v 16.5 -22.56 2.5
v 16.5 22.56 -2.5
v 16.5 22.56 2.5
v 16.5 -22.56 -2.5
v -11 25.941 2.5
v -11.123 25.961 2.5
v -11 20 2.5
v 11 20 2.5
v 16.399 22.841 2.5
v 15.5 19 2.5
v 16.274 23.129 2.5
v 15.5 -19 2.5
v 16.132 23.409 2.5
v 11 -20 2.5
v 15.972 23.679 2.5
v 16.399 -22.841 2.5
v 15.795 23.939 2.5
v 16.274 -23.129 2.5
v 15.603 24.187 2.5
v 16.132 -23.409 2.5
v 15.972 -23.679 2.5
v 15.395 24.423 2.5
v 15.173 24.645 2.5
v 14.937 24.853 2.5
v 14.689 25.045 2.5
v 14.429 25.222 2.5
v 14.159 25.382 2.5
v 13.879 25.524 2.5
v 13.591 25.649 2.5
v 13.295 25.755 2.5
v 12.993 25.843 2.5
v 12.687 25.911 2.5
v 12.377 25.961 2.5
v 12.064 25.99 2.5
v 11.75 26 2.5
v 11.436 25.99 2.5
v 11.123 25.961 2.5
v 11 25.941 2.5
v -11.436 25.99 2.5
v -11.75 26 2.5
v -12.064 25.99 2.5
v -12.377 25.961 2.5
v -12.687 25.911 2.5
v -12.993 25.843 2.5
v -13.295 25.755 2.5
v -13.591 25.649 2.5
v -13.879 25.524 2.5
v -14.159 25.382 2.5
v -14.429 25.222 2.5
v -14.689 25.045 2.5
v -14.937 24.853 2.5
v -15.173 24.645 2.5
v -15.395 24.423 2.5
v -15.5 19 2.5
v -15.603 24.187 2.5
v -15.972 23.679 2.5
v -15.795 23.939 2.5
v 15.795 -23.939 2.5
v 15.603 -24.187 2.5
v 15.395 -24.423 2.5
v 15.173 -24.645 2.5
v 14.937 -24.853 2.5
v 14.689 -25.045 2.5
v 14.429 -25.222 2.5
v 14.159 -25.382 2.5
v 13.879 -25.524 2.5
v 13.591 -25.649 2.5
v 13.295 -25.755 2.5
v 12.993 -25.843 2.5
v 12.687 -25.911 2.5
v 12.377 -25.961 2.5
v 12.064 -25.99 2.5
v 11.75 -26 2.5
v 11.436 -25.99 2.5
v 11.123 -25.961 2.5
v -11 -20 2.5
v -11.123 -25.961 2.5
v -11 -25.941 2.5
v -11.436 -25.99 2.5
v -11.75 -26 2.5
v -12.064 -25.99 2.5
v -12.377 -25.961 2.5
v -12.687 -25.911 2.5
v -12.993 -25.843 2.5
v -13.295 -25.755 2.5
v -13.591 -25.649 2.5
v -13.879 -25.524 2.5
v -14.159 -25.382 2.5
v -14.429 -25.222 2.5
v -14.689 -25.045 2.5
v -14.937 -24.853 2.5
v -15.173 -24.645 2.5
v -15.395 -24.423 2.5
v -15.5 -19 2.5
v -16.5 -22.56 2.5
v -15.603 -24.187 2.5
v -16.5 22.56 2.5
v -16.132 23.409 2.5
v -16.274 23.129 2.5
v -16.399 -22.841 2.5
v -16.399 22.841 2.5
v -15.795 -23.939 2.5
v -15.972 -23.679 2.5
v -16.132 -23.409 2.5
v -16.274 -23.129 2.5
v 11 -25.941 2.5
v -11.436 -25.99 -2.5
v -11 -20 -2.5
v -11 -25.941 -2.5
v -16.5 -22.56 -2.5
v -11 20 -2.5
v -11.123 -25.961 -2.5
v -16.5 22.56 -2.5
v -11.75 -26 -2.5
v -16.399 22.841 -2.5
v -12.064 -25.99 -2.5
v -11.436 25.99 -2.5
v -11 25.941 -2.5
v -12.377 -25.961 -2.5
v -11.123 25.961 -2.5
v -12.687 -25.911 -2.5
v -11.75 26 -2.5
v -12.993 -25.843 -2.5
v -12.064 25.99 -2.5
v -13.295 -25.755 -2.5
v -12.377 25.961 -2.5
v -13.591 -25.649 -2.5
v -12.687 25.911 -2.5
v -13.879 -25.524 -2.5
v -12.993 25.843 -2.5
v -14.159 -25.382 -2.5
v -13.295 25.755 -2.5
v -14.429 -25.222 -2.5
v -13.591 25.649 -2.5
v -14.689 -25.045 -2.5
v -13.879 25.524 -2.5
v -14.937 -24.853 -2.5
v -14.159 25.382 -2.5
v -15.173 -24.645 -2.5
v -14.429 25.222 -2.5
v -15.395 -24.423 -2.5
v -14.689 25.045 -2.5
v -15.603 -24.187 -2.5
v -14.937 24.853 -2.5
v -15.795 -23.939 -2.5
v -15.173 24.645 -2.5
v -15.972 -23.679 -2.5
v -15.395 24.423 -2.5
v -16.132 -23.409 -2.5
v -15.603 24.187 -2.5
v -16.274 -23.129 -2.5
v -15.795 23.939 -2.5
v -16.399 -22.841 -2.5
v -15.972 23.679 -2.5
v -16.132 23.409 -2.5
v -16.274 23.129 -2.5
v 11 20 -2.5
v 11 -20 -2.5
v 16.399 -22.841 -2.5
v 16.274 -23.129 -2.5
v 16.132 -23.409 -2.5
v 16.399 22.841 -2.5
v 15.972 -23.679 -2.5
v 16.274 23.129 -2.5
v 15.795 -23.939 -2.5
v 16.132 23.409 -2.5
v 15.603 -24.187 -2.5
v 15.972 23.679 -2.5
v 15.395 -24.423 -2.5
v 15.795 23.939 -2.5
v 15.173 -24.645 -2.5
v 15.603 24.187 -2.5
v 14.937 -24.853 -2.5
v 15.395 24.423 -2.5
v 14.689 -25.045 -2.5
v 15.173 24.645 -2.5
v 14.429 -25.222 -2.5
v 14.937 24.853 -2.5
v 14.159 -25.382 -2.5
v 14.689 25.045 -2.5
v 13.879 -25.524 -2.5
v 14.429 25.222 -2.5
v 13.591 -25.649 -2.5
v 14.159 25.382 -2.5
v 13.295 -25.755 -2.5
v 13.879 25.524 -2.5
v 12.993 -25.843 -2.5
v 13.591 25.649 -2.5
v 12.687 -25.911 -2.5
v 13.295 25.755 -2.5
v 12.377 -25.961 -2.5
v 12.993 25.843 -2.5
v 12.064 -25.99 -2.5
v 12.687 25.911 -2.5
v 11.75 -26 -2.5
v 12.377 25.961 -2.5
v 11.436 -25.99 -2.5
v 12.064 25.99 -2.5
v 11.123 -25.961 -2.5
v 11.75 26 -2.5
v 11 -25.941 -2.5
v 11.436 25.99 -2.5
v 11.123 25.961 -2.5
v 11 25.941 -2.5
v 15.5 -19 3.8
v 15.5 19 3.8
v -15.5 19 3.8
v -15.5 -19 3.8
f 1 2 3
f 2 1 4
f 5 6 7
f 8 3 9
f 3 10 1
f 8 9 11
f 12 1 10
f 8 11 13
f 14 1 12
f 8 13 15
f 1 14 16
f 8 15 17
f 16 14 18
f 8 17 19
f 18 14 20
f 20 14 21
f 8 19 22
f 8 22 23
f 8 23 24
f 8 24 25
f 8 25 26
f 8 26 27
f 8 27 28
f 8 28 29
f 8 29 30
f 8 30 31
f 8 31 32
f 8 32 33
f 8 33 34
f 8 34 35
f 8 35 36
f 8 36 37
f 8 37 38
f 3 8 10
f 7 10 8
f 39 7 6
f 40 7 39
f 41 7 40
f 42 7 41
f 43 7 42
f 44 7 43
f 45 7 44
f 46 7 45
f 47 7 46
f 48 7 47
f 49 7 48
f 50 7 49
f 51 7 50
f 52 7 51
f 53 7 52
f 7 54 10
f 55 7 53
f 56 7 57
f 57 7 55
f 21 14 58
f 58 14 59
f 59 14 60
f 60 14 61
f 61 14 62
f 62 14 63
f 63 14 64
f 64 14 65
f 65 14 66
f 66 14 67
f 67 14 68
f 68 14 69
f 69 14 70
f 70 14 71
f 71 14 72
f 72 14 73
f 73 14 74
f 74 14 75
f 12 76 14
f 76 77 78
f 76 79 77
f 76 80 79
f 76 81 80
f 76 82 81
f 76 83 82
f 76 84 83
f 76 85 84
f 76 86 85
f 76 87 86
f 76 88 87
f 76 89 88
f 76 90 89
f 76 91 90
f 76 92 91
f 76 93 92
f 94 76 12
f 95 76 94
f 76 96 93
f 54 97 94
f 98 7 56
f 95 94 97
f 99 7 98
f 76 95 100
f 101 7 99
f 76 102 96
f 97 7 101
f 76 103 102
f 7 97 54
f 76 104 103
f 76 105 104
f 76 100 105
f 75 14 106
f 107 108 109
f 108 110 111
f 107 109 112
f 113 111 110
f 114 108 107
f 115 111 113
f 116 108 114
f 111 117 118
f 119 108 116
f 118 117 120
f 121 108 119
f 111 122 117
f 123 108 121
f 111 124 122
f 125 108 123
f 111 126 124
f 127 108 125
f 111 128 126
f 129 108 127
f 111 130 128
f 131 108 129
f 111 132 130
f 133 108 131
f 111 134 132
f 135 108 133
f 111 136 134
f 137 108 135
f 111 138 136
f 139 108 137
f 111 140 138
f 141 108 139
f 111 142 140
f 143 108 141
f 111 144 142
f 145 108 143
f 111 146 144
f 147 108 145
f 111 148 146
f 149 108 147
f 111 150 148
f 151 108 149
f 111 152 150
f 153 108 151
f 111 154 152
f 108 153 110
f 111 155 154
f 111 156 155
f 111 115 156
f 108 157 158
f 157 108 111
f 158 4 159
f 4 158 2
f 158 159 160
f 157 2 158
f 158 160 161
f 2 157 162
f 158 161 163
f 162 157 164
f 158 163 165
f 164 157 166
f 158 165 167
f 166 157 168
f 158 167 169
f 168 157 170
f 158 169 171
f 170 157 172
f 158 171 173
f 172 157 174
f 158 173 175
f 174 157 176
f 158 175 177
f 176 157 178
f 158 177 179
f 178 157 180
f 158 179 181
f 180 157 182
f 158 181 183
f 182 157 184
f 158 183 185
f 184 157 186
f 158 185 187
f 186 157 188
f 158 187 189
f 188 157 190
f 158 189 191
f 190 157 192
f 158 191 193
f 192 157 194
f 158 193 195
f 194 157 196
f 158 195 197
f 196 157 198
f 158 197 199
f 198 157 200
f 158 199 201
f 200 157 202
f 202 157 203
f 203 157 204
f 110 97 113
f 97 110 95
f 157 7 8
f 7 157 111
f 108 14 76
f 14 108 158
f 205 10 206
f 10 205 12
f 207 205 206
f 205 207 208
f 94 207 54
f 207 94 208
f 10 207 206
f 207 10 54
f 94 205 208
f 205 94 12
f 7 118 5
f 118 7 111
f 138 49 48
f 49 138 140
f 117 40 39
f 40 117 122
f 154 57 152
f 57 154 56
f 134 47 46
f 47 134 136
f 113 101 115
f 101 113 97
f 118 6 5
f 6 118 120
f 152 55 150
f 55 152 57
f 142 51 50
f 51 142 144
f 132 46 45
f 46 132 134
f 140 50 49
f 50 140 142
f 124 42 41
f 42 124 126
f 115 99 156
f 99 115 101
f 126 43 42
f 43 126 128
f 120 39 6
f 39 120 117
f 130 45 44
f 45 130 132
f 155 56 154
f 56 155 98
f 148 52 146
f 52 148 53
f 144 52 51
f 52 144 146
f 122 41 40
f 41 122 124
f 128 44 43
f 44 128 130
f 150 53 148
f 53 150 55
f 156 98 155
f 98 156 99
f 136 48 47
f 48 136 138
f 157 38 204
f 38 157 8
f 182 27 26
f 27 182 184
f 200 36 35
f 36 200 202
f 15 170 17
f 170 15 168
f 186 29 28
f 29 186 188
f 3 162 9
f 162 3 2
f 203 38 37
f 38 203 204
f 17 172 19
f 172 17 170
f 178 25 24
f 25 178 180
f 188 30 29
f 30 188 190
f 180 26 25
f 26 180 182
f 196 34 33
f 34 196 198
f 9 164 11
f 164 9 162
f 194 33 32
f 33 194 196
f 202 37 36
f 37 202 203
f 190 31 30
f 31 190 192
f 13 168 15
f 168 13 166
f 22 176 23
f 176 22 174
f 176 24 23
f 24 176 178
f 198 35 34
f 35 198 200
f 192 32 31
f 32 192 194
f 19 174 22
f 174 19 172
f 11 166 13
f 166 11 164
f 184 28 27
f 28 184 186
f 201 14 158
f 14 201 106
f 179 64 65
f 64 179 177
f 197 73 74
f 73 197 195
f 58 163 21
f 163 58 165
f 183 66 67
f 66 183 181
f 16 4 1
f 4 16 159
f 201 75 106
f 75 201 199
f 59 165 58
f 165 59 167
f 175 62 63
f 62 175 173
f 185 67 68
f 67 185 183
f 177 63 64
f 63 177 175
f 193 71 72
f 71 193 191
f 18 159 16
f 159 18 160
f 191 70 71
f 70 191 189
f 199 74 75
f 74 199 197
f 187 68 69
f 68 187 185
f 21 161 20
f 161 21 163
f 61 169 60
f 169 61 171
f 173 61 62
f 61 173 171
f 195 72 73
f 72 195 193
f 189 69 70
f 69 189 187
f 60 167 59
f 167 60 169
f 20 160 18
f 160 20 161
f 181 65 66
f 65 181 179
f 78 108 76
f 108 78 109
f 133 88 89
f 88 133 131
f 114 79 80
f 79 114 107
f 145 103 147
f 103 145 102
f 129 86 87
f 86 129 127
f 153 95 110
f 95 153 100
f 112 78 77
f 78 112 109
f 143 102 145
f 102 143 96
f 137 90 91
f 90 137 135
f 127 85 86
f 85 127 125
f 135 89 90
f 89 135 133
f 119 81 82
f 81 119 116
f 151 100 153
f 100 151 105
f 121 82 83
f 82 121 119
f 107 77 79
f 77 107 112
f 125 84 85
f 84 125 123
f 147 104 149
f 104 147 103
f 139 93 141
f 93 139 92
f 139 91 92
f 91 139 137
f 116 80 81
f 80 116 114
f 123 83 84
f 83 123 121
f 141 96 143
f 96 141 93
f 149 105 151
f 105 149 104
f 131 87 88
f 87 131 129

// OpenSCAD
$fn = 100;

strap_width = 22;
strap_length = 40;
ws2812_length = 5;
ws2812_width = 5;

light_rows = 4;
light_columns = 3;

face_width = strap_width * 1.5;
face_length = 40;
face_height = 5;

pcb_width = face_width - 2;
pcb_length = face_length - 2;
pcb_height = 1.6;

lug_width = (face_width - strap_width) / 2;
lug_length = 7;
lug_height = face_height;

union() {
    %straps();
    face();
    lugs();
}

module face() {
    cube([face_width, face_length, face_height], center=true);
    translate([0, 0, 3])
        color("blue")
        cube([pcb_width, pcb_length, pcb_height], center=true);
    %lights();
}

module lug() {
    intersection() {
        cube([lug_width, lug_length, lug_height], center=true);
        translate([10 / 5, -10 / 4, 0])
            cylinder(h=lug_height, d=10, center=true);
    }
}

module lugs() {
    translate([-face_width / 2 + lug_width / 2,
               face_length / 2 + lug_length / 2,
               0])
        mirror([0, 0, 0])
        lug();
    translate([face_width / 2 - lug_width / 2,
               face_length / 2 + lug_length / 2,
               0])
        mirror([1, 0, 0])
        lug();
    translate([face_width / 2 - lug_width / 2,
               -face_length / 2 - lug_length / 2,
               0])
        mirror([0, 1, 0])
        mirror([1, 0, 0])
        lug();
    translate([-face_width / 2 + lug_width / 2,
               -face_length / 2 - lug_length / 2,
               0])
        mirror([0, 1, 0])
        lug();
}

module lights() {
    light_margin_x = ws2812_width / 2;
    light_margin_y = ws2812_length / 2;
    
    light_padding_x = face_width - (ws2812_width * light_columns) - light_margin_x;
    light_padding_y = face_length - (ws2812_length * light_rows) - light_margin_y;

    light_pitch_x = ws2812_width + (light_padding_x / (light_columns - 1));
    light_pitch_y = ws2812_length + (light_padding_y / (light_rows - 1));

    echo("light pitch x = ", light_pitch_x);
    echo("light pitch y = ", light_pitch_y);

    start_offset_x = -1 * (face_width  / 2) + (ws2812_width / 2) + (light_margin_x / 2);
    start_offset_y = -1 * (face_length / 2) + (ws2812_length / 2) + (light_margin_y / 2);
    
    for (i = [0:light_columns - 1]) {
        for (y = [0:light_rows - 1]) {
            translate([start_offset_x + (i * light_pitch_x),
                       start_offset_y + (y * light_pitch_y),
                       (face_height / 2) + pcb_height])
                color("red")
                cube([ws2812_width, ws2812_length, 1], center=true);
        }
    }
}

module straps() {
    color("gray") {
        translate([0, -strap_length, 0])
            cube([strap_width, strap_length, 1], center=true);
        translate([0, strap_length, 0])
            cube([strap_width, strap_length, 1], center=true);
    }
}
